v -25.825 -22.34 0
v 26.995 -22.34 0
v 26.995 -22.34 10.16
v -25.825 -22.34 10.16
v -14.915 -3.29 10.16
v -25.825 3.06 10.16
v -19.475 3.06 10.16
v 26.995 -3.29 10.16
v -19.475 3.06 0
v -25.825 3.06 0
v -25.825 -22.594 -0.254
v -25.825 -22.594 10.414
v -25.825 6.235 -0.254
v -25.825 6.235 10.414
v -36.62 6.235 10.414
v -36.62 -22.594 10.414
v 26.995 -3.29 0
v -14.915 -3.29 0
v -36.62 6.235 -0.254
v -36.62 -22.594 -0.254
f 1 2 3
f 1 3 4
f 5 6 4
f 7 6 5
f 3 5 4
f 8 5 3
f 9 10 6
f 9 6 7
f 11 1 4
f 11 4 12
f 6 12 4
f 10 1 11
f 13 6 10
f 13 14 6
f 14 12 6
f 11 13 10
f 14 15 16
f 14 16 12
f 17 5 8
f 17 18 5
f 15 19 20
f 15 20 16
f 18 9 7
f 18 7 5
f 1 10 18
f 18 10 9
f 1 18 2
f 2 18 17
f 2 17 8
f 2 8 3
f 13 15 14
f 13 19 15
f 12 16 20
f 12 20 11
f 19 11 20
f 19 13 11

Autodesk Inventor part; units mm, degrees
ref_plane "YZ Plane" through (0, 0, 0) normal (1, 0, 0) x (0, 1, 0)
ref_plane "XZ Plane" through (0, 0, 0) normal (0, 1, 0) x (-1, 0, 0)
ref_plane "XY Plane" through (0, 0, 0) normal (0, 0, 1) x (1, 0, 0)
sketch "Sketch1" plane through (0, 0, 0) normal (0, 0, 1) x (1, 0, 0)
  line L0 (-36.6197, 6.2354) -> (-25.8247, 6.2354)
  line L1 (-25.8247, 6.2354) -> (-25.8247, -22.3396)
  line L2 (-25.8247, -22.3396) -> (-36.6197, -22.3396)
  line L3 (-36.6197, -22.3396) -> (-36.6197, 6.2354)
  line L4 (-25.8247, 3.0604) -> (-19.4747, 3.0604)
  line L5 (-19.4747, 3.0604) -> (-14.9147, -3.2896)
  line L6 (-14.9147, -3.2896) -> (26.9953, -3.2896)
  line L7 (26.9953, -3.2896) -> (26.9953, -22.3396)
  line L8 (26.9953, -22.3396) -> (-25.8247, -22.3396)
  point P0 (0, 0)
  dimension "d0" = 28.575
  dimension "d1" = 10.795
  dimension "d2" = 25.4
  dimension "d3" = 19.05
  dimension "d4" = 41.91
  dimension "d5" = 6.35
extrude "Extrusion1" add sketch "Sketch1" along normal blind 10.16
sketch "Sketch2" plane through (0, 0, 0) normal (0, 0, -1) x (-1, 0, 0)
  line L0 (36.6197, -22.3396) -> (-26.9953, -22.3396) projected
  line L1 (36.6197, 6.2354) -> (25.8247, 6.2354)
  line L2 (25.8247, 6.2354) -> (25.8247, -22.3396)
  line L3 (25.8247, -22.3396) -> (36.6197, -22.3396)
  line L4 (36.6197, -22.3396) -> (36.6197, 6.2354)
  point P0 (0, 0)
extrude "Extrusion2" add sketch "Sketch2" along normal blind 0.254
sketch "Sketch3" plane through (0, 0, 10.16) normal (0, 0, 1) x (1, 0, 0)
  line L0 (26.9953, -22.3396) -> (-36.6197, -22.3396) projected
  line L1 (-36.6197, 6.2354) -> (-25.8247, 6.2354)
  line L2 (-25.8247, 6.2354) -> (-25.8247, -22.3396)
  line L3 (-25.8247, -22.3396) -> (-36.6197, -22.3396)
  line L4 (-36.6197, -22.3396) -> (-36.6197, 6.2354)
  point P0 (0, 0)
extrude "Extrusion3" add sketch "Sketch3" along normal blind 0.254
sketch "Sketch4" plane through (-25.8247, -22.3396, 0) normal (0, -1, 0) x (1, 0, 0)
  line L0 (-10.795, 10.414) -> (0, 10.414)
  line L1 (0, 10.414) -> (0, -0.254)
  line L2 (0, -0.254) -> (-10.795, -0.254)
  line L3 (-10.795, -0.254) -> (-10.795, 10.414)
  point P0 (25.8247, 0)
extrude "Extrusion4" add sketch "Sketch4" along normal blind 0.254
properties part number "Selenoid Part 1764"
